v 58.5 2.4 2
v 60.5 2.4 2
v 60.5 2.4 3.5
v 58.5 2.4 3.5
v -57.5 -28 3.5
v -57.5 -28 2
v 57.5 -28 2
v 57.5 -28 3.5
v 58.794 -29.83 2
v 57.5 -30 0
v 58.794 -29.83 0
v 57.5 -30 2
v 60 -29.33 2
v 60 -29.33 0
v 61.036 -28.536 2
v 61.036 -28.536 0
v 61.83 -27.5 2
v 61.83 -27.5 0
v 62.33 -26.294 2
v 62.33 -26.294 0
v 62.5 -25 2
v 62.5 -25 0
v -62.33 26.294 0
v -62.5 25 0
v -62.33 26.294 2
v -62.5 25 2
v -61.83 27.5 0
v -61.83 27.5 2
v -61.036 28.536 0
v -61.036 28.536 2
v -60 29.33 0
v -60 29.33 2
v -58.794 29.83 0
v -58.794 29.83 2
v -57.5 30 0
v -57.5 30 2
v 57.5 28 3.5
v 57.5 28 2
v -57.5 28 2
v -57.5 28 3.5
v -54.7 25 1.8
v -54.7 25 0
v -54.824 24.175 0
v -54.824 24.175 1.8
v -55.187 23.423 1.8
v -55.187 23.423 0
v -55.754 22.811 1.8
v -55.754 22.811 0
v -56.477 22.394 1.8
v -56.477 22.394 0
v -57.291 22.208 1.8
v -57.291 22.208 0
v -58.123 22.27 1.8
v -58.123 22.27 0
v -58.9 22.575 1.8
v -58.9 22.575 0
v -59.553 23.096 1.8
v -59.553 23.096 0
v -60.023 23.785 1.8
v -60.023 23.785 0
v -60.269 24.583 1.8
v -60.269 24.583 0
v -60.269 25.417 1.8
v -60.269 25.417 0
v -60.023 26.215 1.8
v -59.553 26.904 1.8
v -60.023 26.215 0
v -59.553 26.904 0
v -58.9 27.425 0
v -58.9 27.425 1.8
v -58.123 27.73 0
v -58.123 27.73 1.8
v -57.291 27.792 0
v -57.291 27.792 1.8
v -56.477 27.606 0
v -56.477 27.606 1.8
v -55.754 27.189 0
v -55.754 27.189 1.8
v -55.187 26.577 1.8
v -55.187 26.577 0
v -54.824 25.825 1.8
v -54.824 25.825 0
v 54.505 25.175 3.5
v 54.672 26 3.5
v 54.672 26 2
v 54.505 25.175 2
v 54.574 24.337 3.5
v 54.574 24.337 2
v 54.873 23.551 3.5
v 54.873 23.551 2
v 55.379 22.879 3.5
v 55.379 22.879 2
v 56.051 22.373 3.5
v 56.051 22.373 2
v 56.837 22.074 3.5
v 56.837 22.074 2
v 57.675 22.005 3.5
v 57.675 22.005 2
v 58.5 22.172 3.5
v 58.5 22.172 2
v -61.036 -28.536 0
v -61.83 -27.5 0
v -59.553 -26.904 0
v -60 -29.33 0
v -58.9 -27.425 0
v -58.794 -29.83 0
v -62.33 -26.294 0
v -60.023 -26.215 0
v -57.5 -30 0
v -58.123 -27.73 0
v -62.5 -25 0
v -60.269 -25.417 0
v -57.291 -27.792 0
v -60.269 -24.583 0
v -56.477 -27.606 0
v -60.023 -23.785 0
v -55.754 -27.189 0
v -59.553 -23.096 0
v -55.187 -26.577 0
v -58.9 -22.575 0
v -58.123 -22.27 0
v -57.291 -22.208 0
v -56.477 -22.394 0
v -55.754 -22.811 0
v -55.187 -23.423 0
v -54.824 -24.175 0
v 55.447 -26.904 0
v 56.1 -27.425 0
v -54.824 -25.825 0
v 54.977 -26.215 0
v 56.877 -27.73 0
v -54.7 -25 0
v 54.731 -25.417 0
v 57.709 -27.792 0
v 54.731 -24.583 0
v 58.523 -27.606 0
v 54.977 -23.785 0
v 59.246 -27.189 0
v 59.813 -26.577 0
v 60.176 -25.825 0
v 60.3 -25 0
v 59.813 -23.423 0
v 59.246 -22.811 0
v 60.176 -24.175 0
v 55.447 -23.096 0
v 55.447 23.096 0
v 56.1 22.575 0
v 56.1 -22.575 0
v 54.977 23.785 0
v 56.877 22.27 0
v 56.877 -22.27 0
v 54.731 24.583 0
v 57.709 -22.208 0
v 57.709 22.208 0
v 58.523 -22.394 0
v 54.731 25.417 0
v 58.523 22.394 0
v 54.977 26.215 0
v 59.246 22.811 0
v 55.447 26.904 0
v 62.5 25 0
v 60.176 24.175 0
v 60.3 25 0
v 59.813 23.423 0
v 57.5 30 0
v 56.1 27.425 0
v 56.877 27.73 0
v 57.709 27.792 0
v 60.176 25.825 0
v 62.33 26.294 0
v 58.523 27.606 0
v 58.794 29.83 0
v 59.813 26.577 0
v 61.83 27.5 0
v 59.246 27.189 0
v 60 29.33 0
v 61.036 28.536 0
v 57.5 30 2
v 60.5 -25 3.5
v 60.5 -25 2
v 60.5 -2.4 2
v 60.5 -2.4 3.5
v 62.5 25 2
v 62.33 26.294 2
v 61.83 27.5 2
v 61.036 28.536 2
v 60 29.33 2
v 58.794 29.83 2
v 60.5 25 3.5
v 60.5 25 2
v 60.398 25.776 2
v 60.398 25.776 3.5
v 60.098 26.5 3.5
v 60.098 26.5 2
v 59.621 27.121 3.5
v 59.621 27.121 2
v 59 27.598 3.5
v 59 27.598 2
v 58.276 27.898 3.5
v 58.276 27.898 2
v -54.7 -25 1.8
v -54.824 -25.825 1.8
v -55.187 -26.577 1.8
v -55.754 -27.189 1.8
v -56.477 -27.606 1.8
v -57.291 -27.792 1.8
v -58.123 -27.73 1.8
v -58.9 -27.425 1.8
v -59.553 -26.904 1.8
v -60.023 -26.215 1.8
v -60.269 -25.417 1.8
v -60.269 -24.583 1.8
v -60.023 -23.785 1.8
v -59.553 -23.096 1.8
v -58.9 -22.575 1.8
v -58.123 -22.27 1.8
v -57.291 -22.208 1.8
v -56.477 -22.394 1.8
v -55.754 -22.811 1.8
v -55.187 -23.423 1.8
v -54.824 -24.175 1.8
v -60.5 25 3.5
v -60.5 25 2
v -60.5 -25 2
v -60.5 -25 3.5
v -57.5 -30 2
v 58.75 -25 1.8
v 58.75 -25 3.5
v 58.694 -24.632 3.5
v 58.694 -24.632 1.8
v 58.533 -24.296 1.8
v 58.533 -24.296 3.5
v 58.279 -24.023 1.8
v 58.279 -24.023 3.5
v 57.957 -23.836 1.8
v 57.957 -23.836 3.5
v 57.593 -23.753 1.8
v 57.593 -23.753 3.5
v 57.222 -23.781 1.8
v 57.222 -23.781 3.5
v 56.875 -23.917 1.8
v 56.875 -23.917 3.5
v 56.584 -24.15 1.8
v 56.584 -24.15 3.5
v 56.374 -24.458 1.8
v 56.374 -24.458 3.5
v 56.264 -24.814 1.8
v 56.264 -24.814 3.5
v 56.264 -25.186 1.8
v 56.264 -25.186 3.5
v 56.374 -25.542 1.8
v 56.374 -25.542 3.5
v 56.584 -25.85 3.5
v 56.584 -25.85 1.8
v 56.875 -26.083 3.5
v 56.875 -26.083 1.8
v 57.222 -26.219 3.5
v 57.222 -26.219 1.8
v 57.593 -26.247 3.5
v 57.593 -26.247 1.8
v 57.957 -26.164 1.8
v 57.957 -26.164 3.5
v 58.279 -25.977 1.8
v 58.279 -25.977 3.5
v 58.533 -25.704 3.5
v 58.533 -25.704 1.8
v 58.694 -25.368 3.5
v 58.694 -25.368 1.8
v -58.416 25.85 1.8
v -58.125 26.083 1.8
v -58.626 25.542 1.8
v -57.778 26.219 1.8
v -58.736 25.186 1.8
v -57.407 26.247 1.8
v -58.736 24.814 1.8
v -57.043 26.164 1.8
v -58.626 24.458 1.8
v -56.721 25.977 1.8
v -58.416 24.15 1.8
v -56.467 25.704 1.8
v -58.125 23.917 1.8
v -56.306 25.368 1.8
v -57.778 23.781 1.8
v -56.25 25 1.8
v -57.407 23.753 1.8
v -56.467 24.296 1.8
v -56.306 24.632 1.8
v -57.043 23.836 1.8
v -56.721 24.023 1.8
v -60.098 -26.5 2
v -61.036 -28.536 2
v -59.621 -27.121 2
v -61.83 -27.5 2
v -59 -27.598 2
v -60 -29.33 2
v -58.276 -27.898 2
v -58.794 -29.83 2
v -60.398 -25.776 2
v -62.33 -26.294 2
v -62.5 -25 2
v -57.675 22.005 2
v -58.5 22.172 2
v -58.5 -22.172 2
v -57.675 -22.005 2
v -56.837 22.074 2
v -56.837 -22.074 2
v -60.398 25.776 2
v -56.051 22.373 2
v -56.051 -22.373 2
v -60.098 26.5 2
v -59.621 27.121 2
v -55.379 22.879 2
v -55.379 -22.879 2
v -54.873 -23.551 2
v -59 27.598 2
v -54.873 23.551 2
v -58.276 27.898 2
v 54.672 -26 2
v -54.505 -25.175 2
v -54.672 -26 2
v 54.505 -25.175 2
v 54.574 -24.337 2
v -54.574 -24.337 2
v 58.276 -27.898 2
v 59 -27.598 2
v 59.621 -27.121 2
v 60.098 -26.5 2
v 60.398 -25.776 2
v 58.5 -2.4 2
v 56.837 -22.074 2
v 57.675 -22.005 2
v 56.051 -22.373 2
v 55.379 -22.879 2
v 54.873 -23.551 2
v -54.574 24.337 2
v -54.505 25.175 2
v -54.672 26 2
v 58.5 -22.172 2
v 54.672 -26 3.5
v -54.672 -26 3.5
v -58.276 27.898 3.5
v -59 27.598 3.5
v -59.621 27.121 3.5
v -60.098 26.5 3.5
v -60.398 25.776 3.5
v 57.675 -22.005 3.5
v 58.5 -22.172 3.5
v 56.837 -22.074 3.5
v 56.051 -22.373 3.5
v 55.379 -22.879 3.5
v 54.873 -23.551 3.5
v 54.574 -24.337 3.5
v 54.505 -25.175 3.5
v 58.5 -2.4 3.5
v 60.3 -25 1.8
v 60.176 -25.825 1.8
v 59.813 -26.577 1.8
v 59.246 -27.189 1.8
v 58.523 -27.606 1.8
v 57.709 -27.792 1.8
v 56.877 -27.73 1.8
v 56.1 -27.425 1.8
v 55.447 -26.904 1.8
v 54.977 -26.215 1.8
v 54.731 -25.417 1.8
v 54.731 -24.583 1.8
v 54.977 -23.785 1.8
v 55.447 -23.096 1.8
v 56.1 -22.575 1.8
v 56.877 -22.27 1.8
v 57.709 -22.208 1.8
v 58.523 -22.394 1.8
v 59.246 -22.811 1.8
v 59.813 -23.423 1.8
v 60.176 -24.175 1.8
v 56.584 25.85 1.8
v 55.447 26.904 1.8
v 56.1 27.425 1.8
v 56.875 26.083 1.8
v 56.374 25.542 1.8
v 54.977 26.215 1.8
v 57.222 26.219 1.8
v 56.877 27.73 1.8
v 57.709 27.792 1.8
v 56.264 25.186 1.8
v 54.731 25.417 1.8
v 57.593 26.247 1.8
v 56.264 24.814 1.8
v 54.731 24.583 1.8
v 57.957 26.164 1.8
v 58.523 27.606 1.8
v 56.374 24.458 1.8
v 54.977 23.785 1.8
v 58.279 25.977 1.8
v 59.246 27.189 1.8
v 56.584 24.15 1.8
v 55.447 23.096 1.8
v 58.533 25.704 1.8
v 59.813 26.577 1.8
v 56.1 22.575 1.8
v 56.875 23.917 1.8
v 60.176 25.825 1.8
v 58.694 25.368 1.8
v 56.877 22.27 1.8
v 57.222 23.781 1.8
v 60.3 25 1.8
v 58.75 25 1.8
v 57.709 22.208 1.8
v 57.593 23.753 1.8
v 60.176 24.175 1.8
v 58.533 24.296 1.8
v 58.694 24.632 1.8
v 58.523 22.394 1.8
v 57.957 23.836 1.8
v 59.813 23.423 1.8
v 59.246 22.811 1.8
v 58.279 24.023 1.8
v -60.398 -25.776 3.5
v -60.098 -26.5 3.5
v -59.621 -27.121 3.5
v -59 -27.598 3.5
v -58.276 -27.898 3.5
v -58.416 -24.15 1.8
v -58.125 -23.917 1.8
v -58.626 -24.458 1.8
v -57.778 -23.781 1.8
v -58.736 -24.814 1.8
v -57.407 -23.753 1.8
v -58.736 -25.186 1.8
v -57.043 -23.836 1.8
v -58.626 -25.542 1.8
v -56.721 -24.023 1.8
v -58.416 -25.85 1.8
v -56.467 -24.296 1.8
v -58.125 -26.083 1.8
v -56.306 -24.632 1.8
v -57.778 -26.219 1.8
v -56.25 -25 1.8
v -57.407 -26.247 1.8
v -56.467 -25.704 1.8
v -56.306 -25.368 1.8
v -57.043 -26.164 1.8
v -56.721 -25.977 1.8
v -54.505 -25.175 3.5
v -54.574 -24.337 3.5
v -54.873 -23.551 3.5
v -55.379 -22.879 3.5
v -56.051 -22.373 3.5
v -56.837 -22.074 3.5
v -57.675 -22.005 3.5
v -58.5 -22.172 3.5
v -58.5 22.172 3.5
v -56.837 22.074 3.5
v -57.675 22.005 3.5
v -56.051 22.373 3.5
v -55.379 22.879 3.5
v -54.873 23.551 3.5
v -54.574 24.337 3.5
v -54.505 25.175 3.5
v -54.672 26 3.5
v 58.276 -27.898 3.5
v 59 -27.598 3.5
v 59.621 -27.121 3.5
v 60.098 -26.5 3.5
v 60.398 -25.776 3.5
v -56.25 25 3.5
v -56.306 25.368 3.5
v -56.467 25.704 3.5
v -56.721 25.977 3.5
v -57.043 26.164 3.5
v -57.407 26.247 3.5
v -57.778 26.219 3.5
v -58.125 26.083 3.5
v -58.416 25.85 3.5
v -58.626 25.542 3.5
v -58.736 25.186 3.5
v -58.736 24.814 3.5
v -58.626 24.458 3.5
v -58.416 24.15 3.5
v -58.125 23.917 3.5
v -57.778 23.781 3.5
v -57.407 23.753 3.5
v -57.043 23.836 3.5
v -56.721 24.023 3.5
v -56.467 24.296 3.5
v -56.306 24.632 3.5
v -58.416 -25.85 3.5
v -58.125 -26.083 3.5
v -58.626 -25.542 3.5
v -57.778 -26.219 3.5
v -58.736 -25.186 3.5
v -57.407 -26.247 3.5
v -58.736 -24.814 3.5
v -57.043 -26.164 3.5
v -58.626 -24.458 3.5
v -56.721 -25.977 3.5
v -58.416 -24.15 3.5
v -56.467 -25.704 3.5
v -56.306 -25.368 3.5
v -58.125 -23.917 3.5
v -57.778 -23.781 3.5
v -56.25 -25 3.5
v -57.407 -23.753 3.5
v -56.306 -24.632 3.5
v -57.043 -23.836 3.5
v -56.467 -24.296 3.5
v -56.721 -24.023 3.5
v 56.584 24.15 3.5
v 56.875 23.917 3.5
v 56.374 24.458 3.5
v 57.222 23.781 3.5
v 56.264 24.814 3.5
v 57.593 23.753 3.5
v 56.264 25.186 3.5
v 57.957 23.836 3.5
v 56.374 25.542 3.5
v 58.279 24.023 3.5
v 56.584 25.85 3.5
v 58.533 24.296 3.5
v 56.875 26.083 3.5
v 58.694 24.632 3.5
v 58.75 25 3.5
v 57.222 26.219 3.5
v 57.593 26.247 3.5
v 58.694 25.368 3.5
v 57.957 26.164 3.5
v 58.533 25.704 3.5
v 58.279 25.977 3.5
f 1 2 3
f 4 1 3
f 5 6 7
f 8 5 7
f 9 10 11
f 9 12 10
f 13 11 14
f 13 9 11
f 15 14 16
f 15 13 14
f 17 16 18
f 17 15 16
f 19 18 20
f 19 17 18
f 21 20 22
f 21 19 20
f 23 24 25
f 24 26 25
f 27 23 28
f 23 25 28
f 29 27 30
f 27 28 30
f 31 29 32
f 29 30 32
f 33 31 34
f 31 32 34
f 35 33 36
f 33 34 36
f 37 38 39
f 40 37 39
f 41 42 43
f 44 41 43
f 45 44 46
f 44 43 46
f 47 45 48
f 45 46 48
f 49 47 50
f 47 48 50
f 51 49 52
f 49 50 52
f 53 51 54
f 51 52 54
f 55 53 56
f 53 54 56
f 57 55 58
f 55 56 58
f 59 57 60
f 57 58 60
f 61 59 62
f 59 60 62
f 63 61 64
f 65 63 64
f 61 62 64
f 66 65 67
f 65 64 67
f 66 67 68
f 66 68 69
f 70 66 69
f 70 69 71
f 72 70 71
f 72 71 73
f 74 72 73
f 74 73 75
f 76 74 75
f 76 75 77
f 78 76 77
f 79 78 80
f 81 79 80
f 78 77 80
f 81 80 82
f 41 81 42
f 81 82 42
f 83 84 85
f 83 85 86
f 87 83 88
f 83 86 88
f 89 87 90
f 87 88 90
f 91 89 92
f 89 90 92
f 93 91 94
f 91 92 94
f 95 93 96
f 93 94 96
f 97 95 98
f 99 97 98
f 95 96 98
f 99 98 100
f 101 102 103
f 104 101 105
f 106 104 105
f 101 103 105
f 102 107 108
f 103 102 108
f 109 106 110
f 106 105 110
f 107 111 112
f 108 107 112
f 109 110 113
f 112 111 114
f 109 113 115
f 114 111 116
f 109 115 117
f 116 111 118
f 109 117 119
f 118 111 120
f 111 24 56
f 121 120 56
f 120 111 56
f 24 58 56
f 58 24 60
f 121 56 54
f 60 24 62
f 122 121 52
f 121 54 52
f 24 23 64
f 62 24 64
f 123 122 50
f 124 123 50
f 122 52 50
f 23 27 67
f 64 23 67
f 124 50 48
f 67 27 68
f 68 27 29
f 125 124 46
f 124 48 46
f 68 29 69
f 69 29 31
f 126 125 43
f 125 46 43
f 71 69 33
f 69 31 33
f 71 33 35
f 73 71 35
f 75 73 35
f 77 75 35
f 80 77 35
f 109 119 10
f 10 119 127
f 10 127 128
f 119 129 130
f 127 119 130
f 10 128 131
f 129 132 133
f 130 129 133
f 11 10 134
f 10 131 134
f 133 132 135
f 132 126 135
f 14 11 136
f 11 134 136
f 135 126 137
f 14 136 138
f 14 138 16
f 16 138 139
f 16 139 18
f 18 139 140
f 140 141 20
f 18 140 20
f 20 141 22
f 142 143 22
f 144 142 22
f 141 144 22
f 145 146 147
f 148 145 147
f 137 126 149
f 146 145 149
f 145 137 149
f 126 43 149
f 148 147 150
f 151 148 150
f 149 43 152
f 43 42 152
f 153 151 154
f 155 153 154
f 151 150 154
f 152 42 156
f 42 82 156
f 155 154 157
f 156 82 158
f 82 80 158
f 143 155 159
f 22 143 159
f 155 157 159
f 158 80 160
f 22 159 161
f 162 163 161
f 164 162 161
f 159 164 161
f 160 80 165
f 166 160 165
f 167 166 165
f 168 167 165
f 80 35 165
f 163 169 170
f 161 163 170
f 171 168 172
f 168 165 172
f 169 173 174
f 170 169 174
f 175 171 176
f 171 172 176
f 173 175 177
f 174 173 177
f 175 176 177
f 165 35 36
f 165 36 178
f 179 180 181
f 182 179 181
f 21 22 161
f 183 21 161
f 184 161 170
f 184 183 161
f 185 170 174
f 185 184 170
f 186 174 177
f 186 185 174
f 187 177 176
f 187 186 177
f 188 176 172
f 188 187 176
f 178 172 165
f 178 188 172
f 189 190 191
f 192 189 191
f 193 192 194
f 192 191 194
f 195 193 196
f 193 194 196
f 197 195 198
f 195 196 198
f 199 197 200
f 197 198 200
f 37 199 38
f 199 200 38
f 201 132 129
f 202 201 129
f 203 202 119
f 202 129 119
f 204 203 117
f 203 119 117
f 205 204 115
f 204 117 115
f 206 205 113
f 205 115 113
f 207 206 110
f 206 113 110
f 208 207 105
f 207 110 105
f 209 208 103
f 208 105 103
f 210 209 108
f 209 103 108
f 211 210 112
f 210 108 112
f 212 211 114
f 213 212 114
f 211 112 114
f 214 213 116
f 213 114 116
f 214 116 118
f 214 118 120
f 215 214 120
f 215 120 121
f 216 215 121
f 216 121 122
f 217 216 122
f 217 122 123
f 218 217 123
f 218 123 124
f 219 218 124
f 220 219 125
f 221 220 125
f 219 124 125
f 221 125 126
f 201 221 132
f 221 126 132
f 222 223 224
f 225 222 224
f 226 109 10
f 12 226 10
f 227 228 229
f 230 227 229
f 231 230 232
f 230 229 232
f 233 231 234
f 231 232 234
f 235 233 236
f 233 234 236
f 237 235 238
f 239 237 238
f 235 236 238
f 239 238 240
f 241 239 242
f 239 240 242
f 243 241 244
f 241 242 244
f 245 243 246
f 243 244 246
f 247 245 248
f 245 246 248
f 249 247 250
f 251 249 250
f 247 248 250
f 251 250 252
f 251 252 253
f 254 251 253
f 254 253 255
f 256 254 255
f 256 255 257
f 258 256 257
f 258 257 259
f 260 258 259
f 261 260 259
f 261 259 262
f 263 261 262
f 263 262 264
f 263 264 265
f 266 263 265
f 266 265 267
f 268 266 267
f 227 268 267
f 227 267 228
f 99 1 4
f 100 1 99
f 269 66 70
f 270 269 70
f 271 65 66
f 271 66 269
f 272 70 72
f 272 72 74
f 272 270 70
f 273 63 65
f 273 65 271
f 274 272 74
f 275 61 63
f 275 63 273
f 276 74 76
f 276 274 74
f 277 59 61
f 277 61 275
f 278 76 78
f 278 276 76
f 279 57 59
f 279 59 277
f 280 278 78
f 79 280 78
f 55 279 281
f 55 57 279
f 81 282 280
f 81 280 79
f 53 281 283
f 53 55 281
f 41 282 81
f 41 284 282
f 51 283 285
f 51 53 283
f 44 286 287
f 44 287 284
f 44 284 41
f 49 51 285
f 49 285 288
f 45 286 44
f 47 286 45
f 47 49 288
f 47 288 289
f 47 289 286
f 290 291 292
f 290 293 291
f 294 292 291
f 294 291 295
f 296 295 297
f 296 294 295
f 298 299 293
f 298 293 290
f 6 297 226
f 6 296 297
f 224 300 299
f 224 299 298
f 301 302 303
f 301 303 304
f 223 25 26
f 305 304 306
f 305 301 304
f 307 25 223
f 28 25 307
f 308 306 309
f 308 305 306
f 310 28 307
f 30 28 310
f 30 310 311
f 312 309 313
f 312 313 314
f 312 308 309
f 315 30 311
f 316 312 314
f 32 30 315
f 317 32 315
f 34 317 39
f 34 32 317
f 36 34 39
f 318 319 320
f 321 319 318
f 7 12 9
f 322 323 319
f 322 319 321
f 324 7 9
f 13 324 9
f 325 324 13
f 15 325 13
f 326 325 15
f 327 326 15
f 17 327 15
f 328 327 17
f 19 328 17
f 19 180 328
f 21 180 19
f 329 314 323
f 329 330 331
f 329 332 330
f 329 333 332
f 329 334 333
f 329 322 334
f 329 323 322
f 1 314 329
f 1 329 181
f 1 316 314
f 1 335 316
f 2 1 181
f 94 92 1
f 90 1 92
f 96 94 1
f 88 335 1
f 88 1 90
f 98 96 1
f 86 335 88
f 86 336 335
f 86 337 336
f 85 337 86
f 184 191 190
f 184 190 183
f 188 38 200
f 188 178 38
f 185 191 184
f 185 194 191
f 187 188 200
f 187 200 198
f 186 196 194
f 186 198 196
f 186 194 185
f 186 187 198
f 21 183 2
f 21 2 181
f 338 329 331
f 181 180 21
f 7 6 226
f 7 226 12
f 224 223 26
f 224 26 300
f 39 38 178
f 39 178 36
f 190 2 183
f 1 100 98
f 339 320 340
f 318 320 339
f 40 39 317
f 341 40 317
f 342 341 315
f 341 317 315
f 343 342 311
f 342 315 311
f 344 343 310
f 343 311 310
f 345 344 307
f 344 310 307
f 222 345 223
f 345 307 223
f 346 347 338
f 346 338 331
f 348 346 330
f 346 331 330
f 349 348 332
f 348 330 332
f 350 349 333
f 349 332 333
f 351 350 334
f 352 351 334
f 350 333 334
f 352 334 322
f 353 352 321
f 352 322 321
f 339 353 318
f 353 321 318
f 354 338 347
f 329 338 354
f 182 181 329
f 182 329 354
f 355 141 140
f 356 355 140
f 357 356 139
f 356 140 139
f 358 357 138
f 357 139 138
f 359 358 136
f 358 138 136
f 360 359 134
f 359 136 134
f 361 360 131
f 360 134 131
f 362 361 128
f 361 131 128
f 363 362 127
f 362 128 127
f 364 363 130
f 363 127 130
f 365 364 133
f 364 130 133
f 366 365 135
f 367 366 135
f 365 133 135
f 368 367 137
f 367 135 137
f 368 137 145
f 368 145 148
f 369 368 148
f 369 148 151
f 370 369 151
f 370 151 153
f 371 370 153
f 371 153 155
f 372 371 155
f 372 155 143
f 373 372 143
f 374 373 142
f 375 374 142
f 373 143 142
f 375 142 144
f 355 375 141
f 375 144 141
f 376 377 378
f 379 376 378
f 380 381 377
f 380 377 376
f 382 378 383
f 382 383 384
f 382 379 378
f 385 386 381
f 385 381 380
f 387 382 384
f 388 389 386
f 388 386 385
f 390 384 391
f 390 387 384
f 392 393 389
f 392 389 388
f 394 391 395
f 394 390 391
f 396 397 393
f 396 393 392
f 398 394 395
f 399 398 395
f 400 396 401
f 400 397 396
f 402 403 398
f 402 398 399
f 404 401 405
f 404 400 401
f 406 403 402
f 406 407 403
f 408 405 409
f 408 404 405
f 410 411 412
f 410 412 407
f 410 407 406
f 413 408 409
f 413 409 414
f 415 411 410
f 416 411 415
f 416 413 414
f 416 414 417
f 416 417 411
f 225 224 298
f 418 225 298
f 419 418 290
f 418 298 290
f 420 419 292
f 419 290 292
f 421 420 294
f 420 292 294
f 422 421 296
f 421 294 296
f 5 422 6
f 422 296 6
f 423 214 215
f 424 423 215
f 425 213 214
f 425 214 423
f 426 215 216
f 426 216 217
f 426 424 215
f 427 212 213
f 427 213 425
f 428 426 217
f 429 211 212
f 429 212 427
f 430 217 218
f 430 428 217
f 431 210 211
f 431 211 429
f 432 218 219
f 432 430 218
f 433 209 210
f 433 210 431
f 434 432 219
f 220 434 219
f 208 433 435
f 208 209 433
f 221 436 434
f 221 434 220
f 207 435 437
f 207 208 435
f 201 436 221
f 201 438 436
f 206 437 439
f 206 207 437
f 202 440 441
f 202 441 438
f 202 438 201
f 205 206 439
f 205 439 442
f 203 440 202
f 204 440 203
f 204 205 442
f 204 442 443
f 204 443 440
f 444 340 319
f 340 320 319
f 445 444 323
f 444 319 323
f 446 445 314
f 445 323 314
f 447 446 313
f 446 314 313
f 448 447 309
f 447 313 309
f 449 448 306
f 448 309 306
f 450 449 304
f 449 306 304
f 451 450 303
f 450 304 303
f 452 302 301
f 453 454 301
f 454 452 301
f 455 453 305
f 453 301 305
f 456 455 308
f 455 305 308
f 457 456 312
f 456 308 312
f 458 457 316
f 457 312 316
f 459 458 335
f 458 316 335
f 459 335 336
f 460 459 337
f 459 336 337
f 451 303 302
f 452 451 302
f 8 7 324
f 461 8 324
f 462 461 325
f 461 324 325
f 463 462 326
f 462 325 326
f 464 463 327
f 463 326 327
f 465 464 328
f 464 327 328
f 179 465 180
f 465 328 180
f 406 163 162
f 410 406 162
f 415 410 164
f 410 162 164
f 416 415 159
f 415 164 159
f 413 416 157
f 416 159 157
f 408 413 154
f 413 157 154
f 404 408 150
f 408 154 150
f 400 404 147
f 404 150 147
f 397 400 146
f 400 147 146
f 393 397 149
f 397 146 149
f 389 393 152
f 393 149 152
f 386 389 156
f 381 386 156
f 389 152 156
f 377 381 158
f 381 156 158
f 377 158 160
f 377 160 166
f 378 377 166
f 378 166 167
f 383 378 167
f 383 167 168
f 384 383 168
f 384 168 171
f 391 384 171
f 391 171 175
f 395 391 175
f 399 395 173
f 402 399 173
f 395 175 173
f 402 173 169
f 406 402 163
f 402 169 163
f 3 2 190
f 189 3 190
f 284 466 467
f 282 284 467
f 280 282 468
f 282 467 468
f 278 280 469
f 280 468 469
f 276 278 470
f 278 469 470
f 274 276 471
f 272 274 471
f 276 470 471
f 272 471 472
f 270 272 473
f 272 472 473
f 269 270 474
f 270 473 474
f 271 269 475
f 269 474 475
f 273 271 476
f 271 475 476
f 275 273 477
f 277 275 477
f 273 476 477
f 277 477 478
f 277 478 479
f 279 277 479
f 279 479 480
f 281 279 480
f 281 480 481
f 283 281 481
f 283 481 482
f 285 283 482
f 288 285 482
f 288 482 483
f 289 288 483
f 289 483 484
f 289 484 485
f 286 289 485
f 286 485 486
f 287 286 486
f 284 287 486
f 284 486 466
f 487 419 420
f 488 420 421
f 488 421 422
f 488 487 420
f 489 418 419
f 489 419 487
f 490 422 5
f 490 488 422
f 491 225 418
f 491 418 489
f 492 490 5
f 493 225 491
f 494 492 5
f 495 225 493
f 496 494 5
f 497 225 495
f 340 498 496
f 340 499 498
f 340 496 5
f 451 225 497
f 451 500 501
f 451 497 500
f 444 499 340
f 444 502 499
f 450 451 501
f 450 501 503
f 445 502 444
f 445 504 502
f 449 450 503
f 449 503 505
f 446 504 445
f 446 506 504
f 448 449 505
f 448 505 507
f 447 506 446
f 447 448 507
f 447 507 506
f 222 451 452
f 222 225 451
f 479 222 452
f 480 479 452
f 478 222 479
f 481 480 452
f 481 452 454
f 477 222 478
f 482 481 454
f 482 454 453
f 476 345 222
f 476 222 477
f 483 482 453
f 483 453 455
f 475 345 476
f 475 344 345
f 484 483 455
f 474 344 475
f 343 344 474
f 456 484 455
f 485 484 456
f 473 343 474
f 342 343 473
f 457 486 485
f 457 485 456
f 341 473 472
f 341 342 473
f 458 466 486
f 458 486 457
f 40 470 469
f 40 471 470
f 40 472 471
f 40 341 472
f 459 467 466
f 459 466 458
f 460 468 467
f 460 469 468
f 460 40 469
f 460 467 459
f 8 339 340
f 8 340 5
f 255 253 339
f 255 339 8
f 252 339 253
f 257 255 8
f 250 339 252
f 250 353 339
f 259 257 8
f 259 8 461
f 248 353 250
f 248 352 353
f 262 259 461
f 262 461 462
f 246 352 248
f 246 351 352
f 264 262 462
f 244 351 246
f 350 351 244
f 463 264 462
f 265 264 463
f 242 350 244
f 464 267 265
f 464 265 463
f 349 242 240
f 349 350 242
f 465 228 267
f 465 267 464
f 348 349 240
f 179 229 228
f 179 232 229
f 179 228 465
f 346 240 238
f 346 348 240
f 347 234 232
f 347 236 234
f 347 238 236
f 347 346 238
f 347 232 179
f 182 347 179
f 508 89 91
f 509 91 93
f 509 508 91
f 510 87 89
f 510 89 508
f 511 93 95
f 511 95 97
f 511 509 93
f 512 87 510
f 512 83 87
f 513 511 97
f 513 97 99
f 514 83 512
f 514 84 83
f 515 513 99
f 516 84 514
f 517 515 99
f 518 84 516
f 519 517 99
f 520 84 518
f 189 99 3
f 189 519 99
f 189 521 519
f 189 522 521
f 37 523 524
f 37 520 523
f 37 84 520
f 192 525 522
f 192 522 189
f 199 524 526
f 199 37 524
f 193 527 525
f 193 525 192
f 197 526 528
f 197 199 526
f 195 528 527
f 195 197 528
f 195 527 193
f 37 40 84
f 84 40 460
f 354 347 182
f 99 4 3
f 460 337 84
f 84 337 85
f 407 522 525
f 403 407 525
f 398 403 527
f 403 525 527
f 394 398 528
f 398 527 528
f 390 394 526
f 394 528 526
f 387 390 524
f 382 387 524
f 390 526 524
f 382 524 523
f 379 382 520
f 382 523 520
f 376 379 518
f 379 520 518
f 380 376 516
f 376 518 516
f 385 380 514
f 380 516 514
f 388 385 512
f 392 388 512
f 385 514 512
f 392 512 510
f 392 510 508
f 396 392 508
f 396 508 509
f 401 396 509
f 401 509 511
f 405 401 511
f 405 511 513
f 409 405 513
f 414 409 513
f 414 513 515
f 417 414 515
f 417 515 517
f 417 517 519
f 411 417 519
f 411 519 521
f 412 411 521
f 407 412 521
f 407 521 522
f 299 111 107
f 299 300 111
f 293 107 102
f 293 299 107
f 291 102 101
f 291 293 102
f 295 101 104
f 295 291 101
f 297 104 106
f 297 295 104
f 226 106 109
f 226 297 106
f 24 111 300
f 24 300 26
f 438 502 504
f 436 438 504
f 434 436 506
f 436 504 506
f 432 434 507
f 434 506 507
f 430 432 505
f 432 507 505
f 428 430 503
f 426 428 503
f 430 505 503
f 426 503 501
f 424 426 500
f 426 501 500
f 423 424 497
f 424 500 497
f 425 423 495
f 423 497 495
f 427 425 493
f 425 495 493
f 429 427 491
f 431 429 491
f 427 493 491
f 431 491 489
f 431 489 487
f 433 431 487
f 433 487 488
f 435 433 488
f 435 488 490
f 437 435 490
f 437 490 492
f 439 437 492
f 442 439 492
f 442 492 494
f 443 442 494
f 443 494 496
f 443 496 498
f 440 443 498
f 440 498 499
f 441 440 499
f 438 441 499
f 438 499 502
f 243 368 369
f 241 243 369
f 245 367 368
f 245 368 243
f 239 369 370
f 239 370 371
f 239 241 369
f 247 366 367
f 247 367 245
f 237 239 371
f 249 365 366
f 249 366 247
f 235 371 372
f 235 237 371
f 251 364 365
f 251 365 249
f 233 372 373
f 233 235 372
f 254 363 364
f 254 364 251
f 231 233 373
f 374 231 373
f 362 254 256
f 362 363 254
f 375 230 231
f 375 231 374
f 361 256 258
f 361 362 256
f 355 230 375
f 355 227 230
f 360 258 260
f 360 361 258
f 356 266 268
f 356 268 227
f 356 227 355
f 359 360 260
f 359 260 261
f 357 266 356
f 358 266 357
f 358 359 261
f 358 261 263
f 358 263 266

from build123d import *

# Parameters (mm, degrees)
F0_W      = 125
F0_H      = 60
F1_DEPTH  = 2
F2_T      = -2
F3_R      = 5
F4_R      = 1.25
F5_DEPTH  = 10
F6_W      = 117
F6_H      = 52
F7_DEPTH  = 1.5
F8_R      = 3
F9_DEPTH  = 1.5
F10_R     = 1.25
F11_DEPTH = 3.5
F12_R     = 2.8
F13_DEPTH = 1.8
F14_W     = 4.8
F14_H     = 1.5
F15_DEPTH = 2


with BuildPart() as f1:
    # F0 (on Top) → F1 (new body)
    with BuildSketch(Plane.XY):
        Rectangle(F0_W, F0_H)
    extrude(amount=F1_DEPTH)

    # F2
    f2_openings = [f1.faces().sort_by_distance(p)[0] for p in [
        (0, 0, 2),
    ]]
    offset(amount=F2_T, openings=f2_openings)

    # F3
    f3_edges = [f1.edges().sort_by_distance(p)[0] for p in [
        (62.5, -30, 1),
        (62.5, 30, 1),
        (-62.5, 30, 1),
        (-62.5, -30, 1),
    ]]
    fillet(f3_edges, radius=F3_R)

    # F4 (on face) → F5 (cut)
    with BuildSketch(Plane.XY.offset(2)):
        with Locations((-57.5, 25)):
            Circle(F4_R)
        with Locations((-57.5, -25)):
            Circle(F4_R)
        with Locations((57.5, 25)):
            Circle(F4_R)
        with Locations((57.5, -25)):
            Circle(F4_R)
    extrude(amount=F5_DEPTH, mode=Mode.SUBTRACT)

    # F6 (on face) → F7 (join)
    with BuildSketch(Plane.XY.offset(2)):
        with BuildLine():
            ThreePointArc((60.5, 25), (59.62132, 27.12132), (57.5, 28))
            Line((57.5, 28), (-57.5, 28))
            ThreePointArc((-57.5, 28), (-59.62132, 27.12132), (-60.5, 25))
            Line((-60.5, 25), (-60.5, -25))
            ThreePointArc((-60.5, -25), (-59.62132, -27.12132), (-57.5, -28))
            Line((-57.5, -28), (57.5, -28))
            ThreePointArc((57.5, -28), (59.62132, -27.12132), (60.5, -25))
            Line((60.5, -25), (60.5, 25))
        make_face()
        Rectangle(F6_W, F6_H, mode=Mode.SUBTRACT)
    extrude(amount=F7_DEPTH)

    # F8 (on face) → F9 (join)
    with BuildSketch(Plane.XY.offset(2)):
        with Locations((-57.5, 25)):
            Circle(F8_R)
        with Locations((-57.5, -25)):
            Circle(F8_R)
        with Locations((57.5, -25)):
            Circle(F8_R)
        with Locations((57.5, 25)):
            Circle(F8_R)
    extrude(amount=F9_DEPTH)

    # F10 (on face) → F11 (cut, through all)
    with BuildSketch(Plane.XY.offset(3.5)):
        with Locations((57.5, -25)):
            Circle(F10_R)
        with Locations((57.5, 25)):
            Circle(F10_R)
        with Locations((-57.5, 25)):
            Circle(F10_R)
        with Locations((-57.5, -25)):
            Circle(F10_R)
    extrude(amount=-F11_DEPTH, mode=Mode.SUBTRACT)

    # F12 (on face) → F13 (cut)
    with BuildSketch(Plane(origin=(0, 0, 0), x_dir=(1, 0, 0), z_dir=(0, 0, -1))):
        with Locations((-57.5, 25)):
            Circle(F12_R)
        with Locations((57.5, 25)):
            Circle(F12_R)
        with Locations((-57.5, -25)):
            Circle(F12_R)
        with Locations((57.5, -25)):
            Circle(F12_R)
    extrude(amount=-F13_DEPTH, mode=Mode.SUBTRACT)

    # F14 (on face) → F15 (cut, through all)
    with BuildSketch(Plane.YZ.offset(60.5)):
        with Locations((0, 2.75)):
            Rectangle(F14_W, F14_H)
    extrude(amount=-F15_DEPTH, mode=Mode.SUBTRACT)


solid = f1.part
